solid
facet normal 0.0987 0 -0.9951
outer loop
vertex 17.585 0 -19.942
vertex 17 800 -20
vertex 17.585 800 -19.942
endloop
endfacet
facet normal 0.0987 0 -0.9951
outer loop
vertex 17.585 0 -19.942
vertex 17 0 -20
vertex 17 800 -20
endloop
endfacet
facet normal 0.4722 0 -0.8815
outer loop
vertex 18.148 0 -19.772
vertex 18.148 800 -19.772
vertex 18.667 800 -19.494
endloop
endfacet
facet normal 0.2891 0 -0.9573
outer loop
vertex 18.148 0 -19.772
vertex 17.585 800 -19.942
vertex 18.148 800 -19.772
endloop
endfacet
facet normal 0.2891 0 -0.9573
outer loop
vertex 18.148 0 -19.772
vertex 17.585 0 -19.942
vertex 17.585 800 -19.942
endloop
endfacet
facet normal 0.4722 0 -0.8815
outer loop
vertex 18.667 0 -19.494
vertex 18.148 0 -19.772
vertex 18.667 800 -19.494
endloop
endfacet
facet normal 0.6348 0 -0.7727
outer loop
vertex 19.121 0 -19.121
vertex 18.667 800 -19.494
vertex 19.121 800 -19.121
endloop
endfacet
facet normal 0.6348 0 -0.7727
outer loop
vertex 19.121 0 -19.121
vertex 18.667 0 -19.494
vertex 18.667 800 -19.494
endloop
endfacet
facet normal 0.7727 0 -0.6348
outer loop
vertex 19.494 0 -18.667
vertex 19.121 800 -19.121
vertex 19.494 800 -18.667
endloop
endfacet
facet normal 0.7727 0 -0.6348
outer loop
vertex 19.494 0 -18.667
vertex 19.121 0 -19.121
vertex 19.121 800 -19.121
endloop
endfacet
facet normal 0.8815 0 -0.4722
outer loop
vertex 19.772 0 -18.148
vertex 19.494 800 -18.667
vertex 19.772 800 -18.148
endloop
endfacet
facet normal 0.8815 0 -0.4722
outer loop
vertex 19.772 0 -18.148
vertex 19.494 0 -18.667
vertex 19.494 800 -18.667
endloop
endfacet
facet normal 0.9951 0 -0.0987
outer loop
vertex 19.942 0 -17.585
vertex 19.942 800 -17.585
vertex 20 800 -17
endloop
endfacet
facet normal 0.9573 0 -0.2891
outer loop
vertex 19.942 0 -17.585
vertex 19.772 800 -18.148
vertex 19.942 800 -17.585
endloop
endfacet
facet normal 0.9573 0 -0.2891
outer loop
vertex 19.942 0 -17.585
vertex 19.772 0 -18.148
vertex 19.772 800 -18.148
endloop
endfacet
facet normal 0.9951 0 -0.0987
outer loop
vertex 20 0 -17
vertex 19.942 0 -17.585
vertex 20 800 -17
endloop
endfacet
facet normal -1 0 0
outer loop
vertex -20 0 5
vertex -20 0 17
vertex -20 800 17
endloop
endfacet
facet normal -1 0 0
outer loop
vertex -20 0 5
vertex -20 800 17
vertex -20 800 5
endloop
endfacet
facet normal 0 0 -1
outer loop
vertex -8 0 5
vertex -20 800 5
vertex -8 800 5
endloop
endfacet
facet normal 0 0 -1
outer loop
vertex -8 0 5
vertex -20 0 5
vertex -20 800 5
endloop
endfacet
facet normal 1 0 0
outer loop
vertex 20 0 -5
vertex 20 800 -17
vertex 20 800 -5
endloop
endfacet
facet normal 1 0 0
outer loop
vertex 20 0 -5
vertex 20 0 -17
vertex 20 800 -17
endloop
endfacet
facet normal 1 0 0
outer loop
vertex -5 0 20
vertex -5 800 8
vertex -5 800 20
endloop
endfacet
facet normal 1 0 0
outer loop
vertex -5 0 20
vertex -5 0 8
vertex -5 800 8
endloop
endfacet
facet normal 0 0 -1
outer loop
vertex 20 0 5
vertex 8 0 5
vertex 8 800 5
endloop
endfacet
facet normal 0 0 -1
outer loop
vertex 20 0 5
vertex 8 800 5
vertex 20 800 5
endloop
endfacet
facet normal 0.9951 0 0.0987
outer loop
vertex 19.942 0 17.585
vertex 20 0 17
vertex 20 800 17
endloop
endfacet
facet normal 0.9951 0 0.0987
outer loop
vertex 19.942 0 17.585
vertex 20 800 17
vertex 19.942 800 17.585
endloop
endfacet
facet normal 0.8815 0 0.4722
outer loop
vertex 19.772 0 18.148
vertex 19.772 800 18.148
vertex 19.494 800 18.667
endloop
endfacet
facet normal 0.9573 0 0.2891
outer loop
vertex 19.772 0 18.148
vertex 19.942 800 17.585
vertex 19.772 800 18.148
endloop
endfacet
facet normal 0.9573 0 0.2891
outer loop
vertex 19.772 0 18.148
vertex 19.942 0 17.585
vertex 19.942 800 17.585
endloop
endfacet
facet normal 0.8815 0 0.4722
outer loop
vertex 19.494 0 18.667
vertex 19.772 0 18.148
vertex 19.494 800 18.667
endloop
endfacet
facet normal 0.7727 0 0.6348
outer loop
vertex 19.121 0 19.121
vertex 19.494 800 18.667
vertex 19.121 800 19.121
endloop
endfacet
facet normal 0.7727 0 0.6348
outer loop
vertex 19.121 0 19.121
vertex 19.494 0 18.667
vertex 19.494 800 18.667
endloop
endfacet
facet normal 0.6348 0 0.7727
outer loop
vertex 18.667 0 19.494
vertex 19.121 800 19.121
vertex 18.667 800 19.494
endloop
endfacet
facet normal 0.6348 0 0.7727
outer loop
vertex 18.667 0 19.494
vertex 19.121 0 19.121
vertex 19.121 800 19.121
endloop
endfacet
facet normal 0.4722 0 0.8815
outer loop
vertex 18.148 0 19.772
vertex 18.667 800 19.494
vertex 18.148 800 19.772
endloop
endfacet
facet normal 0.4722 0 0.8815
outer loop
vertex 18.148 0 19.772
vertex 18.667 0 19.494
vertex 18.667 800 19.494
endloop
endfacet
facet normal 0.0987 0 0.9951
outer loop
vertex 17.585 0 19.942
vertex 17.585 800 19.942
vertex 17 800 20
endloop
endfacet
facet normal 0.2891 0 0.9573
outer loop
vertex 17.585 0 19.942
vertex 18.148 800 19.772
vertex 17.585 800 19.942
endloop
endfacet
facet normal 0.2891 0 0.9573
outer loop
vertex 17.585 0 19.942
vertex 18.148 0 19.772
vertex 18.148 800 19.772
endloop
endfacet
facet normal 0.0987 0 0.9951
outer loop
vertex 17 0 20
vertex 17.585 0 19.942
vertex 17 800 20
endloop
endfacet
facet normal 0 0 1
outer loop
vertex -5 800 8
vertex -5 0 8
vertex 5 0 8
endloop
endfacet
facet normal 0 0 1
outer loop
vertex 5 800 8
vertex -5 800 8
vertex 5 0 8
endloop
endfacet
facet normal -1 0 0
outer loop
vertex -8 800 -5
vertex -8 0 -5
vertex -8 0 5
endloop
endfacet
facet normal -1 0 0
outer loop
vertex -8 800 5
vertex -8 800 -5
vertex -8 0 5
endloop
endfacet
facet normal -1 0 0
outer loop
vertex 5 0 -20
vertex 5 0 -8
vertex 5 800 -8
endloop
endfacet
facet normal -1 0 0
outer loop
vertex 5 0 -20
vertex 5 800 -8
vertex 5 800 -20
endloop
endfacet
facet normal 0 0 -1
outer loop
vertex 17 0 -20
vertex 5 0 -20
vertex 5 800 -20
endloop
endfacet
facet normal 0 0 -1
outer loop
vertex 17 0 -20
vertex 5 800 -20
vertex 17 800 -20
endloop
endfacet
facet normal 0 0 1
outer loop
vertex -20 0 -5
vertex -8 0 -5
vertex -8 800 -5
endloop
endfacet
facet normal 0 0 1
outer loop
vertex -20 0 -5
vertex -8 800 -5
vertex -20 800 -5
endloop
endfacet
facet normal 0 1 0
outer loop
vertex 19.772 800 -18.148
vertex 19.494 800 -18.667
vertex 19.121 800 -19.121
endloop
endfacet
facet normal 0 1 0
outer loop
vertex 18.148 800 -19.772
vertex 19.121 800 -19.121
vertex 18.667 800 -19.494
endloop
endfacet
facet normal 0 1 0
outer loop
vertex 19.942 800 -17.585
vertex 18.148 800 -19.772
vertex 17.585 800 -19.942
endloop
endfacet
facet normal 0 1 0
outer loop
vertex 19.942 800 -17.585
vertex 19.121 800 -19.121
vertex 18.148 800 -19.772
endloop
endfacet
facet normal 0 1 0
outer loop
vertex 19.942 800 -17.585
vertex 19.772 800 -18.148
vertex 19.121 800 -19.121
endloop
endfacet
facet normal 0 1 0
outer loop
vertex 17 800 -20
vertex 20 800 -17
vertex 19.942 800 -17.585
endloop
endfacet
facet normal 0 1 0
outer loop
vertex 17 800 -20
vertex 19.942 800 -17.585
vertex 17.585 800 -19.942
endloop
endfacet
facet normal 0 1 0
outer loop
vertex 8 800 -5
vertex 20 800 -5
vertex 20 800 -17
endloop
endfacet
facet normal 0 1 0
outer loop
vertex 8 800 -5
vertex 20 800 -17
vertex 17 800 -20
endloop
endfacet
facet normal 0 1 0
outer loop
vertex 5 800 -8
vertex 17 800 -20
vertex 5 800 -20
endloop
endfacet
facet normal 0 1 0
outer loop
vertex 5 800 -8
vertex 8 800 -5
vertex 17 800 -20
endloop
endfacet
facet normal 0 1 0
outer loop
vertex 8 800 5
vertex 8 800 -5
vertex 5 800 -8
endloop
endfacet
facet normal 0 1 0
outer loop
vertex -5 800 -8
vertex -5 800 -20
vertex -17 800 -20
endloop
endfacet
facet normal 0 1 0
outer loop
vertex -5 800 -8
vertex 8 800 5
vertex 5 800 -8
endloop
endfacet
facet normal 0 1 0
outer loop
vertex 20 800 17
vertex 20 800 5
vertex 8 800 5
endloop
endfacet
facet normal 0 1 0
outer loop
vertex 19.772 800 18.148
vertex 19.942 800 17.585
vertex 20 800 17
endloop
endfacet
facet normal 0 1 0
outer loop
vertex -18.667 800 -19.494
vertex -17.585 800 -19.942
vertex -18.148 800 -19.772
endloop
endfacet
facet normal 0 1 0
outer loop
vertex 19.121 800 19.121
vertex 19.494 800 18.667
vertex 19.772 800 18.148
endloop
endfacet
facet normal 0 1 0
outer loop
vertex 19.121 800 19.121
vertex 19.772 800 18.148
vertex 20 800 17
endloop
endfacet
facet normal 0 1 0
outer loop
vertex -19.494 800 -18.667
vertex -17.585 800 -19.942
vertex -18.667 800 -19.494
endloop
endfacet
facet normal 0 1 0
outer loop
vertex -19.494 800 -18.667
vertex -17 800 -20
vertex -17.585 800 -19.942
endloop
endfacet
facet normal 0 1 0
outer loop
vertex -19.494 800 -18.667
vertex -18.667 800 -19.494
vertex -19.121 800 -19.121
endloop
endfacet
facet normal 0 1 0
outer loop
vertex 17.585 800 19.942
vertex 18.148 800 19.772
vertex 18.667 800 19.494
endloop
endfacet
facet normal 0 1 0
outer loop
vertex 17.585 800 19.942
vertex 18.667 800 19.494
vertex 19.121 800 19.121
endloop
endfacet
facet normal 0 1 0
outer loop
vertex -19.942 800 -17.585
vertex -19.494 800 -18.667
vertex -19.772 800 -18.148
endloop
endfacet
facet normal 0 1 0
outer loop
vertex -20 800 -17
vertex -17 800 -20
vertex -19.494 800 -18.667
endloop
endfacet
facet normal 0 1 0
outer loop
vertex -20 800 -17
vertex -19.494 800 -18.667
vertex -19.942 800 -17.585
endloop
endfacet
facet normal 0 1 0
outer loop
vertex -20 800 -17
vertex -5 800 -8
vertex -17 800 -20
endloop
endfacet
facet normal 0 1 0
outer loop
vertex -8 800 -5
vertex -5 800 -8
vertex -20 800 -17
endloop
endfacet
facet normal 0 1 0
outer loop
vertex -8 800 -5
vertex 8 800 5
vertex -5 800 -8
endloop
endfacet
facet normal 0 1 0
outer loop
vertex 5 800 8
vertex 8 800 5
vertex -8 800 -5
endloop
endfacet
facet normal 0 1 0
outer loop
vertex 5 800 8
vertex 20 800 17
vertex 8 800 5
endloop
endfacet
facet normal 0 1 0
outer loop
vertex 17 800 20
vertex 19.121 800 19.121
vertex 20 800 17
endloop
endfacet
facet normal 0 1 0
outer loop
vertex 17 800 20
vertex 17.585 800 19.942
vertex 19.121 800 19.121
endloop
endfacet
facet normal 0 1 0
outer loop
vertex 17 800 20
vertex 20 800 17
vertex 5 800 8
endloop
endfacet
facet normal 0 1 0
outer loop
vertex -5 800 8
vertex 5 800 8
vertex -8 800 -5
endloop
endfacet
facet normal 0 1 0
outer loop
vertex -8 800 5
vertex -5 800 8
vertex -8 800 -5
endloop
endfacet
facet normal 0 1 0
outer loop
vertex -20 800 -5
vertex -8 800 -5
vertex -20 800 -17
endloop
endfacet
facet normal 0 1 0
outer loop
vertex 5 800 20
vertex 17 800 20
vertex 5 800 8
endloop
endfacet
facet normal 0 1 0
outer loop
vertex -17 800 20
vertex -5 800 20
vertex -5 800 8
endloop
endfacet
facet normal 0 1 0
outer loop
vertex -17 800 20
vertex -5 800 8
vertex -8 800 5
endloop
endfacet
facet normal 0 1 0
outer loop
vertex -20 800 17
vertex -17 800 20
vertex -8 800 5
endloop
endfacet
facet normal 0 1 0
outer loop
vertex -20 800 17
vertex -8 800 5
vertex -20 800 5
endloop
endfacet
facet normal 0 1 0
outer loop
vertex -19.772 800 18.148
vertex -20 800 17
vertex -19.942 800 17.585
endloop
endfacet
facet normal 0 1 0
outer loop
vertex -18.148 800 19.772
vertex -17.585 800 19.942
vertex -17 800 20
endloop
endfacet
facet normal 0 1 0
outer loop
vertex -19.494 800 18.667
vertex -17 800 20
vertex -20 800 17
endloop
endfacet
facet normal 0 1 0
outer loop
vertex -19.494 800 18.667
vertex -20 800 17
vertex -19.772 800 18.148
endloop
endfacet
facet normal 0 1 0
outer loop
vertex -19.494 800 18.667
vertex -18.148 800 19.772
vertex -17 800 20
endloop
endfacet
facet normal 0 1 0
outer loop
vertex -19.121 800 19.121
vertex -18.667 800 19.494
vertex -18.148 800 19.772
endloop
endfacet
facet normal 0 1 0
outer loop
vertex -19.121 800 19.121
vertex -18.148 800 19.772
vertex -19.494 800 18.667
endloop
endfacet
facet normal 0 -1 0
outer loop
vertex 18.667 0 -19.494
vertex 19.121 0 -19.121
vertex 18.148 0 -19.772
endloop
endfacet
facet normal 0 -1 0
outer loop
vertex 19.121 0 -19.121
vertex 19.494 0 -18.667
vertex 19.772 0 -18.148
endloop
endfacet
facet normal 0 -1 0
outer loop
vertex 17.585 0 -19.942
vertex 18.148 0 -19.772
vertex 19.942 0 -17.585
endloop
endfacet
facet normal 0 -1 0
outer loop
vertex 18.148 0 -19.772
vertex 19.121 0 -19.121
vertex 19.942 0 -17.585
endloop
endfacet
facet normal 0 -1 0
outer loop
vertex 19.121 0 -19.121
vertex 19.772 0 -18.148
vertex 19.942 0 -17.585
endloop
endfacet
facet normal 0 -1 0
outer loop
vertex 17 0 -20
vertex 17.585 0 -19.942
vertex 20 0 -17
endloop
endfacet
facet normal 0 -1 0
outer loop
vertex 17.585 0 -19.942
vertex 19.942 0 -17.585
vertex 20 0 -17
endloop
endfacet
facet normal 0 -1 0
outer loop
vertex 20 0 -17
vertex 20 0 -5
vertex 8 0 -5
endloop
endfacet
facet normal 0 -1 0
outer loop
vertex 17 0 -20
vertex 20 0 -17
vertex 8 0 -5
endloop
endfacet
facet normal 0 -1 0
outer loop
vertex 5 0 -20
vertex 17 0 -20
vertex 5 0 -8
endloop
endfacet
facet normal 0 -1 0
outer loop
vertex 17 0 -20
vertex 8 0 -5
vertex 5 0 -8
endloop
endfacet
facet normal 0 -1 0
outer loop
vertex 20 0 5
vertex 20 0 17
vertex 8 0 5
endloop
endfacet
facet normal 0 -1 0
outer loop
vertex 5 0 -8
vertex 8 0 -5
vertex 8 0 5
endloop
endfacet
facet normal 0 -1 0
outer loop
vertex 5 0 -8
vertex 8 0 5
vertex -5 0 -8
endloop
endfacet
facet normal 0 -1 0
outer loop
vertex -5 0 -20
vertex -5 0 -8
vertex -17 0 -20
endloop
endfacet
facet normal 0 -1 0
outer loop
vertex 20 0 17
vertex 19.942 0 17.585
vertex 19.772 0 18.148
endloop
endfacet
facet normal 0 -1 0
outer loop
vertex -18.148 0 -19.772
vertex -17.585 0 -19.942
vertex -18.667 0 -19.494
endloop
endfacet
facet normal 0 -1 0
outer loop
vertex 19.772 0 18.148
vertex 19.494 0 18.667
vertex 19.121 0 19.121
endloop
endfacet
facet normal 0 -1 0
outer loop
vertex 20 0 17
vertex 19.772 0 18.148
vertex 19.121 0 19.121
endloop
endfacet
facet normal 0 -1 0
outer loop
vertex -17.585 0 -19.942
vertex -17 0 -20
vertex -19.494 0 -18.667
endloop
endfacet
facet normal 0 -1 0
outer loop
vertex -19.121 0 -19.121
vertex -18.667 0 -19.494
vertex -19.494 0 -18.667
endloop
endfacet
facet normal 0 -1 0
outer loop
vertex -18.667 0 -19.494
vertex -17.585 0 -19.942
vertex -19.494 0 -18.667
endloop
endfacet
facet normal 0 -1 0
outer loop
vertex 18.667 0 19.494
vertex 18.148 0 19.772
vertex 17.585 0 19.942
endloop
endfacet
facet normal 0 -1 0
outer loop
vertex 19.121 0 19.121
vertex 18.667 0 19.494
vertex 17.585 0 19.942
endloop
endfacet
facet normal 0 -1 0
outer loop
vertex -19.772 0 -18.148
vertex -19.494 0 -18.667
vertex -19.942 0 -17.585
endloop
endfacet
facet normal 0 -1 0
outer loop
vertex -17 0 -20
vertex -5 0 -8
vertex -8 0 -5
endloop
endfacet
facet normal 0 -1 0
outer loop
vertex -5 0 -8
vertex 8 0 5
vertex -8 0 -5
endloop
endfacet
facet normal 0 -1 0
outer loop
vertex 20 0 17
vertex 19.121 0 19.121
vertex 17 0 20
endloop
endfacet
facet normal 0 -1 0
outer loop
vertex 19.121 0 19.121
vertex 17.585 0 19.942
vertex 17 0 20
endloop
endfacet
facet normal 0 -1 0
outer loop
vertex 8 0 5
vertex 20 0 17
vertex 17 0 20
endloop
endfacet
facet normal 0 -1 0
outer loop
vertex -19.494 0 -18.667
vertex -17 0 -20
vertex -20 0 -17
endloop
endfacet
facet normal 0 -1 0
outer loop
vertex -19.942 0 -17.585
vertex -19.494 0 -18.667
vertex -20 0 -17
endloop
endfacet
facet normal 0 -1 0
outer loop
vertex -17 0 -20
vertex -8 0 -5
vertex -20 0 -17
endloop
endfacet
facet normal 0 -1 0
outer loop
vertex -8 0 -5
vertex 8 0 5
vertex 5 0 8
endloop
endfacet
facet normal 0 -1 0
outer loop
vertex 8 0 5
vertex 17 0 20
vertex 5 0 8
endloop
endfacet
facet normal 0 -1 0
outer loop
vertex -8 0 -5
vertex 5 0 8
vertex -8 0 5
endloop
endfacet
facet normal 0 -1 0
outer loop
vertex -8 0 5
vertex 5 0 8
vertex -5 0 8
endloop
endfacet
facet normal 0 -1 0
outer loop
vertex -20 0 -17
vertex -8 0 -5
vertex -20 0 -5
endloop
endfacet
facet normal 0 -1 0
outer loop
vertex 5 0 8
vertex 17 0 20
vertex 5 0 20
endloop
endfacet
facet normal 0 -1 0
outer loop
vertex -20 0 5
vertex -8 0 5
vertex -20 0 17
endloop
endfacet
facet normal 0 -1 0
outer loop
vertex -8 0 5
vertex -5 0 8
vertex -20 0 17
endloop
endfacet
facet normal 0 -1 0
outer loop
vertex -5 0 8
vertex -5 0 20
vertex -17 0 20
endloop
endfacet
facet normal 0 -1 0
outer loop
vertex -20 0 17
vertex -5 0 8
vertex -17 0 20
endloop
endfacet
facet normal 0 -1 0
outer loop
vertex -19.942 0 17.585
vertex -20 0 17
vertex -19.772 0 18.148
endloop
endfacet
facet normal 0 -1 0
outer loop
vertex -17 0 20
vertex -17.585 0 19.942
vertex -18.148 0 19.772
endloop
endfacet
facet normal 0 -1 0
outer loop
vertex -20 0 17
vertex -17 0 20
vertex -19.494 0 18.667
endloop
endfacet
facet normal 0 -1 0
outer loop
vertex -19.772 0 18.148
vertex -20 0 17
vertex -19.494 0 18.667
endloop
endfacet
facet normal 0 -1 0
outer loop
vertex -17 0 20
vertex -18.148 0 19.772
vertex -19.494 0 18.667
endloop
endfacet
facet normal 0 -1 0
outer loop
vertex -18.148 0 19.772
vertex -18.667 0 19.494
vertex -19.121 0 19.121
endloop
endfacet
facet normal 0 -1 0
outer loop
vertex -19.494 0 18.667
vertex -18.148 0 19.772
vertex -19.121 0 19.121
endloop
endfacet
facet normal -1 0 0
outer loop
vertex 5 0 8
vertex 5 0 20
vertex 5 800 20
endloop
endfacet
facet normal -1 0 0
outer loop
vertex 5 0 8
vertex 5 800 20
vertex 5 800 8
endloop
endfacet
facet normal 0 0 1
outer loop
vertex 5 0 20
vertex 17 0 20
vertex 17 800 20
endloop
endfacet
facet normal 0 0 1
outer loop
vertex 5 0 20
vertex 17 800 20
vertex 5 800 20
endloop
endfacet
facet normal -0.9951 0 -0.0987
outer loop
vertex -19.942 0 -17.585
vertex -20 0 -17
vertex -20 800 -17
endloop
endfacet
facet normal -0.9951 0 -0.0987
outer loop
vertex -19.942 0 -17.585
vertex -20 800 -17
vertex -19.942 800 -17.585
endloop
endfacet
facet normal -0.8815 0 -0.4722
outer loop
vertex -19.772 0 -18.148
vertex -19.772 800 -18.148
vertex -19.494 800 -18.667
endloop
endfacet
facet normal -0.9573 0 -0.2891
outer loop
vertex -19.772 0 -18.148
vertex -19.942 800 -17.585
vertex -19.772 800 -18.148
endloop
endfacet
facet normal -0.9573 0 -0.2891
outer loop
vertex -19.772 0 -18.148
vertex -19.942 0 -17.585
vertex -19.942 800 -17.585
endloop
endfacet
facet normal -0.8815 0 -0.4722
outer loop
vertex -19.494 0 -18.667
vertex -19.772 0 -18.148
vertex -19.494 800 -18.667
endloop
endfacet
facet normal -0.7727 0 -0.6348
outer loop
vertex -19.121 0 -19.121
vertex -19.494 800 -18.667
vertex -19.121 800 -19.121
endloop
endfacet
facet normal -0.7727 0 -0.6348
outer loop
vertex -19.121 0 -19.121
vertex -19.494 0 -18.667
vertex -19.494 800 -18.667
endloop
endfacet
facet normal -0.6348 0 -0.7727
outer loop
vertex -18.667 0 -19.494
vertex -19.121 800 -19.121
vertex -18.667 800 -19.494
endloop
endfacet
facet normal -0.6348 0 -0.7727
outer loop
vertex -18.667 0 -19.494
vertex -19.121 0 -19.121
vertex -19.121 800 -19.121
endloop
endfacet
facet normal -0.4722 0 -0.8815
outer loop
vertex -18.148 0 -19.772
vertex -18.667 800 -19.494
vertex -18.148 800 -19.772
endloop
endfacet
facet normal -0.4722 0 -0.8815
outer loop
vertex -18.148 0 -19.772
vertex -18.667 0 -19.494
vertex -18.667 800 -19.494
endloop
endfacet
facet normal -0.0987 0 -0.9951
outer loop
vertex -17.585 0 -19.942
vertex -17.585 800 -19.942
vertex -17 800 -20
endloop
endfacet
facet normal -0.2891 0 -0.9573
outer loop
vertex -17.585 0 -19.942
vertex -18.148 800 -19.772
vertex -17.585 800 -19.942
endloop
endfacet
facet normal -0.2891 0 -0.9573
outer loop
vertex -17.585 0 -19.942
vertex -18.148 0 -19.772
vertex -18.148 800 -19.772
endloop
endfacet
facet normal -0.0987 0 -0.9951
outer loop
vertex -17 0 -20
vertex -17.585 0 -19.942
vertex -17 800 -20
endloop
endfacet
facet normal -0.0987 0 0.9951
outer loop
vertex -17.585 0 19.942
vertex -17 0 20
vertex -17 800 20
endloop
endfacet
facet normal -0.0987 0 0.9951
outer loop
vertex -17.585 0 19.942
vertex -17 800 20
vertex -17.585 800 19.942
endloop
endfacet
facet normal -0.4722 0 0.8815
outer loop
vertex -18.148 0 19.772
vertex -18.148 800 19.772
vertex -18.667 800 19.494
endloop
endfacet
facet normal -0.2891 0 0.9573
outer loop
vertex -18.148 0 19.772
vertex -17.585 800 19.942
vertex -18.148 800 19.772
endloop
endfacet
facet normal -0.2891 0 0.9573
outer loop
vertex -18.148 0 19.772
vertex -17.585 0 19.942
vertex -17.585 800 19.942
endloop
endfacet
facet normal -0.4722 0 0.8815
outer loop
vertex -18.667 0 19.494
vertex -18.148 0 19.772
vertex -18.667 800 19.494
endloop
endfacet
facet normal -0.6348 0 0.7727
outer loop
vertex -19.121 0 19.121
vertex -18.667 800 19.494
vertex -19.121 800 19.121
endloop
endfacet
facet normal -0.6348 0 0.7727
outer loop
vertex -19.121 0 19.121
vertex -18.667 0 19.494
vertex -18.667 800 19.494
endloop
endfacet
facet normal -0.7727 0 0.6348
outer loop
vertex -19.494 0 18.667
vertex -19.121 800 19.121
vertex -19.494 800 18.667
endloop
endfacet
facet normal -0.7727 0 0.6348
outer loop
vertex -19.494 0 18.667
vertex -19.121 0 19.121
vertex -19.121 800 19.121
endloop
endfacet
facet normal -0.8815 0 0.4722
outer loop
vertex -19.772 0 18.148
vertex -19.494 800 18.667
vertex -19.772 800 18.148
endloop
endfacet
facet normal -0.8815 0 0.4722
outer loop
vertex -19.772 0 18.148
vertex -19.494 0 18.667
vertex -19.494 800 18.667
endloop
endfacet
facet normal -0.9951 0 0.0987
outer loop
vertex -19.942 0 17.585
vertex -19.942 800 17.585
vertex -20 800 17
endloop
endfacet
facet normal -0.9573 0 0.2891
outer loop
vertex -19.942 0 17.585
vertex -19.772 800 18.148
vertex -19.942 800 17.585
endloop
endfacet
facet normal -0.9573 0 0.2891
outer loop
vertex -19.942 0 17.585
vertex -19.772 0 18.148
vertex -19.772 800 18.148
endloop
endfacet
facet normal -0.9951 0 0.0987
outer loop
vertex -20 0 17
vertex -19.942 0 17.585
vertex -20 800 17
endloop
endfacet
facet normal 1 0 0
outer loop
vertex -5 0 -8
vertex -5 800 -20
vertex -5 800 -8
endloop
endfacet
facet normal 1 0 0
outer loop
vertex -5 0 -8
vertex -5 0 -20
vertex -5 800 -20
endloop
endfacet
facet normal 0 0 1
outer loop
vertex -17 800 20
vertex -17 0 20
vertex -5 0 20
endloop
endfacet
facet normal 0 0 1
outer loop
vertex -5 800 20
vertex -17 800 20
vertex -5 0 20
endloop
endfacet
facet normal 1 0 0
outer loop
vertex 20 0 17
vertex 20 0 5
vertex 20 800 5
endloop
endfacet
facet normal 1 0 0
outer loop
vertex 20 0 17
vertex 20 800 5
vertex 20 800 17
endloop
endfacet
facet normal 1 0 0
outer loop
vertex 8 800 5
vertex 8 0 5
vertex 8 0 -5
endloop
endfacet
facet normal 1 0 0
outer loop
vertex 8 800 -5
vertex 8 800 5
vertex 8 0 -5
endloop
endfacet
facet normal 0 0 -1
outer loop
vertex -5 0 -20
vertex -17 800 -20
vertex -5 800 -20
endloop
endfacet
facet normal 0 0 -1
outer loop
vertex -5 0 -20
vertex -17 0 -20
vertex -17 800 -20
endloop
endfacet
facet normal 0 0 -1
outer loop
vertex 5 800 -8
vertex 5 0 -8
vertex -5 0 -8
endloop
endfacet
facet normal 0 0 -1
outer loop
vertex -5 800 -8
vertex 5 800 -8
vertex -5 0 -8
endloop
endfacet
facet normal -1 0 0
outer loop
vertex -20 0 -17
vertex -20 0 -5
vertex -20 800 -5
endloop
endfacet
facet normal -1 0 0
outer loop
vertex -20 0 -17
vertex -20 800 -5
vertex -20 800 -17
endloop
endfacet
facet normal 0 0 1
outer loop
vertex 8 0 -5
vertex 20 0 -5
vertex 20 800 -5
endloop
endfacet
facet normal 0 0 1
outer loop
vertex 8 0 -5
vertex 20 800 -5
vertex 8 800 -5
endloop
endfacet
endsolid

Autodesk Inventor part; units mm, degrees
ref_plane "YZ Plane" through (0, 0, 0) normal (1, 0, 0) x (0, 1, 0)
ref_plane "XZ Plane" through (0, 0, 0) normal (0, 1, 0) x (-1, 0, 0)
ref_plane "XY Plane" through (0, 0, 0) normal (0, 0, 1) x (1, 0, 0)
sketch "Sketch1" plane through (0, 0, 0) normal (0, 1, 0) x (-1, 0, 0)
  line L0 (-5, 20) -> (-5, 8)
  line L1 (5, -20) -> (5, -8)
  line L2 (20, 5) -> (8, 5)
  line L3 (-20, -5) -> (-8, -5)
  line L4 (8, -5) -> (20, -5)
  line L5 (-8, 5) -> (-20, 5)
  line L6 (-5, -8) -> (-5, -20)
  line L7 (5, 8) -> (5, 20)
  arc A0 (-17, 20) -> (-20, 17) centre (-17, 17) ccw
  arc A1 (-20, -17) -> (-17, -20) centre (-17, -17) ccw
  arc A2 (17, -20) -> (20, -17) centre (17, -17) ccw
  arc A3 (20, 17) -> (17, 20) centre (17, 17) ccw
  line L8 (20, 17) -> (20, 5)
  line L9 (20, -5) -> (20, -17)
  line L10 (17, -20) -> (5, -20)
  line L11 (-5, -20) -> (-17, -20)
  line L12 (-20, -17) -> (-20, -5)
  line L13 (-20, 5) -> (-20, 17)
  line L14 (-17, 20) -> (-5, 20)
  line L15 (17, 20) -> (5, 20)
  line L16 (5, 8) -> (-5, 8)
  line L17 (-8, 5) -> (-8, -5)
  line L18 (-5, -8) -> (5, -8)
  line L19 (8, -5) -> (8, 5)
  point P0 (0, 0)
extrude "Extrusion1" add sketch "Sketch1" along normal blind 800
properties part number "column"
